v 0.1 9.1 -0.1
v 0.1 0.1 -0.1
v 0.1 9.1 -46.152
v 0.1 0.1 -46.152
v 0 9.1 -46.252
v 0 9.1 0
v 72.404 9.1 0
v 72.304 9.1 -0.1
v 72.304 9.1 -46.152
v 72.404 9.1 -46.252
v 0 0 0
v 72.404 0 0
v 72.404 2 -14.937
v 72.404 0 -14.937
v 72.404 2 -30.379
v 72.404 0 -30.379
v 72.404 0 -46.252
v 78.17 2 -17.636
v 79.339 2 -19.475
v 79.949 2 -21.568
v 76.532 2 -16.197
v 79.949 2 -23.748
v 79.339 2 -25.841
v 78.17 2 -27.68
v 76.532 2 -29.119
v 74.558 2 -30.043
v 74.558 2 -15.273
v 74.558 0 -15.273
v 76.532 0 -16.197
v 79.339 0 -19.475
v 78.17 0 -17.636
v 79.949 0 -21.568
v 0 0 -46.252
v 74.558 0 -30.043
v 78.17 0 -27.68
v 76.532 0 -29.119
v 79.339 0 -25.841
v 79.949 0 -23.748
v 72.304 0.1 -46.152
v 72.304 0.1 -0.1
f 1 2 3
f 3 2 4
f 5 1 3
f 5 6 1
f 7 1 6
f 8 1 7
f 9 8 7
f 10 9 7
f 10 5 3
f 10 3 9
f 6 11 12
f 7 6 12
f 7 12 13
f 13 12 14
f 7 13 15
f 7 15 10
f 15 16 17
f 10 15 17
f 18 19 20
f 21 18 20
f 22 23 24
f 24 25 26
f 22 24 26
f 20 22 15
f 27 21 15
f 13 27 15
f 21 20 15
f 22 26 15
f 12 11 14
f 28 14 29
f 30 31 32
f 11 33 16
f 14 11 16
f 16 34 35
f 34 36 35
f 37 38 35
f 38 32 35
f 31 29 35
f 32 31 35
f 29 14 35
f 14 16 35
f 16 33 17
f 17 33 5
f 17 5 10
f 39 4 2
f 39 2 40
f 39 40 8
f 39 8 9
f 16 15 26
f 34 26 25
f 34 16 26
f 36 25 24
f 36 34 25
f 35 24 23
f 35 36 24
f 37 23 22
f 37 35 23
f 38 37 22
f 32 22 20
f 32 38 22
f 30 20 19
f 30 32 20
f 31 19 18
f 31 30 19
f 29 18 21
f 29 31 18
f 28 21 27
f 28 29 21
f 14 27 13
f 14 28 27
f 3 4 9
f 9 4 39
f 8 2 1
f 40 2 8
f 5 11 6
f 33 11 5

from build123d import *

# Parameters (mm, degrees)
CROQUIS1_W              = 72.404273835
CROQUIS1_H              = 46.251918891
SALIENTE_EXTRUIR1_DEPTH = 9.1
VACIADO2_T              = -0.1
SALIENTE_EXTRUIR2_DEPTH = 2


with BuildPart() as part:
    # Croquis1 → Saliente-Extruir1 (new body)
    with BuildSketch(Plane(origin=(0, 0, 0), x_dir=(1, 0, 0), z_dir=(0, 1, 0))):
        with Locations((36.202136917, 23.125959446)):
            Rectangle(CROQUIS1_W, CROQUIS1_H)
    extrude(amount=SALIENTE_EXTRUIR1_DEPTH)

    # Vaciado2
    vaciado2_openings = [part.faces().sort_by_distance(p)[0] for p in [
        (36.202136917, 9.1, -23.125959446),
    ]]
    offset(amount=VACIADO2_T, openings=vaciado2_openings, kind=Kind.INTERSECTION)

    # Croquis2 → Saliente-Extruir2 (add)
    with BuildSketch(Plane(origin=(0, 0, 0), x_dir=(1, 0, 0), z_dir=(0, 1, 0))):
        with BuildLine():
            Line((72.304273835, 14.936525207), (72.304273835, 30.379638096))
            ThreePointArc((72.304273835, 30.379638096), (80.025830279, 22.658081652), (72.304273835, 14.936525207))
        make_face()
    extrude(amount=SALIENTE_EXTRUIR2_DEPTH)


solid = part.part
